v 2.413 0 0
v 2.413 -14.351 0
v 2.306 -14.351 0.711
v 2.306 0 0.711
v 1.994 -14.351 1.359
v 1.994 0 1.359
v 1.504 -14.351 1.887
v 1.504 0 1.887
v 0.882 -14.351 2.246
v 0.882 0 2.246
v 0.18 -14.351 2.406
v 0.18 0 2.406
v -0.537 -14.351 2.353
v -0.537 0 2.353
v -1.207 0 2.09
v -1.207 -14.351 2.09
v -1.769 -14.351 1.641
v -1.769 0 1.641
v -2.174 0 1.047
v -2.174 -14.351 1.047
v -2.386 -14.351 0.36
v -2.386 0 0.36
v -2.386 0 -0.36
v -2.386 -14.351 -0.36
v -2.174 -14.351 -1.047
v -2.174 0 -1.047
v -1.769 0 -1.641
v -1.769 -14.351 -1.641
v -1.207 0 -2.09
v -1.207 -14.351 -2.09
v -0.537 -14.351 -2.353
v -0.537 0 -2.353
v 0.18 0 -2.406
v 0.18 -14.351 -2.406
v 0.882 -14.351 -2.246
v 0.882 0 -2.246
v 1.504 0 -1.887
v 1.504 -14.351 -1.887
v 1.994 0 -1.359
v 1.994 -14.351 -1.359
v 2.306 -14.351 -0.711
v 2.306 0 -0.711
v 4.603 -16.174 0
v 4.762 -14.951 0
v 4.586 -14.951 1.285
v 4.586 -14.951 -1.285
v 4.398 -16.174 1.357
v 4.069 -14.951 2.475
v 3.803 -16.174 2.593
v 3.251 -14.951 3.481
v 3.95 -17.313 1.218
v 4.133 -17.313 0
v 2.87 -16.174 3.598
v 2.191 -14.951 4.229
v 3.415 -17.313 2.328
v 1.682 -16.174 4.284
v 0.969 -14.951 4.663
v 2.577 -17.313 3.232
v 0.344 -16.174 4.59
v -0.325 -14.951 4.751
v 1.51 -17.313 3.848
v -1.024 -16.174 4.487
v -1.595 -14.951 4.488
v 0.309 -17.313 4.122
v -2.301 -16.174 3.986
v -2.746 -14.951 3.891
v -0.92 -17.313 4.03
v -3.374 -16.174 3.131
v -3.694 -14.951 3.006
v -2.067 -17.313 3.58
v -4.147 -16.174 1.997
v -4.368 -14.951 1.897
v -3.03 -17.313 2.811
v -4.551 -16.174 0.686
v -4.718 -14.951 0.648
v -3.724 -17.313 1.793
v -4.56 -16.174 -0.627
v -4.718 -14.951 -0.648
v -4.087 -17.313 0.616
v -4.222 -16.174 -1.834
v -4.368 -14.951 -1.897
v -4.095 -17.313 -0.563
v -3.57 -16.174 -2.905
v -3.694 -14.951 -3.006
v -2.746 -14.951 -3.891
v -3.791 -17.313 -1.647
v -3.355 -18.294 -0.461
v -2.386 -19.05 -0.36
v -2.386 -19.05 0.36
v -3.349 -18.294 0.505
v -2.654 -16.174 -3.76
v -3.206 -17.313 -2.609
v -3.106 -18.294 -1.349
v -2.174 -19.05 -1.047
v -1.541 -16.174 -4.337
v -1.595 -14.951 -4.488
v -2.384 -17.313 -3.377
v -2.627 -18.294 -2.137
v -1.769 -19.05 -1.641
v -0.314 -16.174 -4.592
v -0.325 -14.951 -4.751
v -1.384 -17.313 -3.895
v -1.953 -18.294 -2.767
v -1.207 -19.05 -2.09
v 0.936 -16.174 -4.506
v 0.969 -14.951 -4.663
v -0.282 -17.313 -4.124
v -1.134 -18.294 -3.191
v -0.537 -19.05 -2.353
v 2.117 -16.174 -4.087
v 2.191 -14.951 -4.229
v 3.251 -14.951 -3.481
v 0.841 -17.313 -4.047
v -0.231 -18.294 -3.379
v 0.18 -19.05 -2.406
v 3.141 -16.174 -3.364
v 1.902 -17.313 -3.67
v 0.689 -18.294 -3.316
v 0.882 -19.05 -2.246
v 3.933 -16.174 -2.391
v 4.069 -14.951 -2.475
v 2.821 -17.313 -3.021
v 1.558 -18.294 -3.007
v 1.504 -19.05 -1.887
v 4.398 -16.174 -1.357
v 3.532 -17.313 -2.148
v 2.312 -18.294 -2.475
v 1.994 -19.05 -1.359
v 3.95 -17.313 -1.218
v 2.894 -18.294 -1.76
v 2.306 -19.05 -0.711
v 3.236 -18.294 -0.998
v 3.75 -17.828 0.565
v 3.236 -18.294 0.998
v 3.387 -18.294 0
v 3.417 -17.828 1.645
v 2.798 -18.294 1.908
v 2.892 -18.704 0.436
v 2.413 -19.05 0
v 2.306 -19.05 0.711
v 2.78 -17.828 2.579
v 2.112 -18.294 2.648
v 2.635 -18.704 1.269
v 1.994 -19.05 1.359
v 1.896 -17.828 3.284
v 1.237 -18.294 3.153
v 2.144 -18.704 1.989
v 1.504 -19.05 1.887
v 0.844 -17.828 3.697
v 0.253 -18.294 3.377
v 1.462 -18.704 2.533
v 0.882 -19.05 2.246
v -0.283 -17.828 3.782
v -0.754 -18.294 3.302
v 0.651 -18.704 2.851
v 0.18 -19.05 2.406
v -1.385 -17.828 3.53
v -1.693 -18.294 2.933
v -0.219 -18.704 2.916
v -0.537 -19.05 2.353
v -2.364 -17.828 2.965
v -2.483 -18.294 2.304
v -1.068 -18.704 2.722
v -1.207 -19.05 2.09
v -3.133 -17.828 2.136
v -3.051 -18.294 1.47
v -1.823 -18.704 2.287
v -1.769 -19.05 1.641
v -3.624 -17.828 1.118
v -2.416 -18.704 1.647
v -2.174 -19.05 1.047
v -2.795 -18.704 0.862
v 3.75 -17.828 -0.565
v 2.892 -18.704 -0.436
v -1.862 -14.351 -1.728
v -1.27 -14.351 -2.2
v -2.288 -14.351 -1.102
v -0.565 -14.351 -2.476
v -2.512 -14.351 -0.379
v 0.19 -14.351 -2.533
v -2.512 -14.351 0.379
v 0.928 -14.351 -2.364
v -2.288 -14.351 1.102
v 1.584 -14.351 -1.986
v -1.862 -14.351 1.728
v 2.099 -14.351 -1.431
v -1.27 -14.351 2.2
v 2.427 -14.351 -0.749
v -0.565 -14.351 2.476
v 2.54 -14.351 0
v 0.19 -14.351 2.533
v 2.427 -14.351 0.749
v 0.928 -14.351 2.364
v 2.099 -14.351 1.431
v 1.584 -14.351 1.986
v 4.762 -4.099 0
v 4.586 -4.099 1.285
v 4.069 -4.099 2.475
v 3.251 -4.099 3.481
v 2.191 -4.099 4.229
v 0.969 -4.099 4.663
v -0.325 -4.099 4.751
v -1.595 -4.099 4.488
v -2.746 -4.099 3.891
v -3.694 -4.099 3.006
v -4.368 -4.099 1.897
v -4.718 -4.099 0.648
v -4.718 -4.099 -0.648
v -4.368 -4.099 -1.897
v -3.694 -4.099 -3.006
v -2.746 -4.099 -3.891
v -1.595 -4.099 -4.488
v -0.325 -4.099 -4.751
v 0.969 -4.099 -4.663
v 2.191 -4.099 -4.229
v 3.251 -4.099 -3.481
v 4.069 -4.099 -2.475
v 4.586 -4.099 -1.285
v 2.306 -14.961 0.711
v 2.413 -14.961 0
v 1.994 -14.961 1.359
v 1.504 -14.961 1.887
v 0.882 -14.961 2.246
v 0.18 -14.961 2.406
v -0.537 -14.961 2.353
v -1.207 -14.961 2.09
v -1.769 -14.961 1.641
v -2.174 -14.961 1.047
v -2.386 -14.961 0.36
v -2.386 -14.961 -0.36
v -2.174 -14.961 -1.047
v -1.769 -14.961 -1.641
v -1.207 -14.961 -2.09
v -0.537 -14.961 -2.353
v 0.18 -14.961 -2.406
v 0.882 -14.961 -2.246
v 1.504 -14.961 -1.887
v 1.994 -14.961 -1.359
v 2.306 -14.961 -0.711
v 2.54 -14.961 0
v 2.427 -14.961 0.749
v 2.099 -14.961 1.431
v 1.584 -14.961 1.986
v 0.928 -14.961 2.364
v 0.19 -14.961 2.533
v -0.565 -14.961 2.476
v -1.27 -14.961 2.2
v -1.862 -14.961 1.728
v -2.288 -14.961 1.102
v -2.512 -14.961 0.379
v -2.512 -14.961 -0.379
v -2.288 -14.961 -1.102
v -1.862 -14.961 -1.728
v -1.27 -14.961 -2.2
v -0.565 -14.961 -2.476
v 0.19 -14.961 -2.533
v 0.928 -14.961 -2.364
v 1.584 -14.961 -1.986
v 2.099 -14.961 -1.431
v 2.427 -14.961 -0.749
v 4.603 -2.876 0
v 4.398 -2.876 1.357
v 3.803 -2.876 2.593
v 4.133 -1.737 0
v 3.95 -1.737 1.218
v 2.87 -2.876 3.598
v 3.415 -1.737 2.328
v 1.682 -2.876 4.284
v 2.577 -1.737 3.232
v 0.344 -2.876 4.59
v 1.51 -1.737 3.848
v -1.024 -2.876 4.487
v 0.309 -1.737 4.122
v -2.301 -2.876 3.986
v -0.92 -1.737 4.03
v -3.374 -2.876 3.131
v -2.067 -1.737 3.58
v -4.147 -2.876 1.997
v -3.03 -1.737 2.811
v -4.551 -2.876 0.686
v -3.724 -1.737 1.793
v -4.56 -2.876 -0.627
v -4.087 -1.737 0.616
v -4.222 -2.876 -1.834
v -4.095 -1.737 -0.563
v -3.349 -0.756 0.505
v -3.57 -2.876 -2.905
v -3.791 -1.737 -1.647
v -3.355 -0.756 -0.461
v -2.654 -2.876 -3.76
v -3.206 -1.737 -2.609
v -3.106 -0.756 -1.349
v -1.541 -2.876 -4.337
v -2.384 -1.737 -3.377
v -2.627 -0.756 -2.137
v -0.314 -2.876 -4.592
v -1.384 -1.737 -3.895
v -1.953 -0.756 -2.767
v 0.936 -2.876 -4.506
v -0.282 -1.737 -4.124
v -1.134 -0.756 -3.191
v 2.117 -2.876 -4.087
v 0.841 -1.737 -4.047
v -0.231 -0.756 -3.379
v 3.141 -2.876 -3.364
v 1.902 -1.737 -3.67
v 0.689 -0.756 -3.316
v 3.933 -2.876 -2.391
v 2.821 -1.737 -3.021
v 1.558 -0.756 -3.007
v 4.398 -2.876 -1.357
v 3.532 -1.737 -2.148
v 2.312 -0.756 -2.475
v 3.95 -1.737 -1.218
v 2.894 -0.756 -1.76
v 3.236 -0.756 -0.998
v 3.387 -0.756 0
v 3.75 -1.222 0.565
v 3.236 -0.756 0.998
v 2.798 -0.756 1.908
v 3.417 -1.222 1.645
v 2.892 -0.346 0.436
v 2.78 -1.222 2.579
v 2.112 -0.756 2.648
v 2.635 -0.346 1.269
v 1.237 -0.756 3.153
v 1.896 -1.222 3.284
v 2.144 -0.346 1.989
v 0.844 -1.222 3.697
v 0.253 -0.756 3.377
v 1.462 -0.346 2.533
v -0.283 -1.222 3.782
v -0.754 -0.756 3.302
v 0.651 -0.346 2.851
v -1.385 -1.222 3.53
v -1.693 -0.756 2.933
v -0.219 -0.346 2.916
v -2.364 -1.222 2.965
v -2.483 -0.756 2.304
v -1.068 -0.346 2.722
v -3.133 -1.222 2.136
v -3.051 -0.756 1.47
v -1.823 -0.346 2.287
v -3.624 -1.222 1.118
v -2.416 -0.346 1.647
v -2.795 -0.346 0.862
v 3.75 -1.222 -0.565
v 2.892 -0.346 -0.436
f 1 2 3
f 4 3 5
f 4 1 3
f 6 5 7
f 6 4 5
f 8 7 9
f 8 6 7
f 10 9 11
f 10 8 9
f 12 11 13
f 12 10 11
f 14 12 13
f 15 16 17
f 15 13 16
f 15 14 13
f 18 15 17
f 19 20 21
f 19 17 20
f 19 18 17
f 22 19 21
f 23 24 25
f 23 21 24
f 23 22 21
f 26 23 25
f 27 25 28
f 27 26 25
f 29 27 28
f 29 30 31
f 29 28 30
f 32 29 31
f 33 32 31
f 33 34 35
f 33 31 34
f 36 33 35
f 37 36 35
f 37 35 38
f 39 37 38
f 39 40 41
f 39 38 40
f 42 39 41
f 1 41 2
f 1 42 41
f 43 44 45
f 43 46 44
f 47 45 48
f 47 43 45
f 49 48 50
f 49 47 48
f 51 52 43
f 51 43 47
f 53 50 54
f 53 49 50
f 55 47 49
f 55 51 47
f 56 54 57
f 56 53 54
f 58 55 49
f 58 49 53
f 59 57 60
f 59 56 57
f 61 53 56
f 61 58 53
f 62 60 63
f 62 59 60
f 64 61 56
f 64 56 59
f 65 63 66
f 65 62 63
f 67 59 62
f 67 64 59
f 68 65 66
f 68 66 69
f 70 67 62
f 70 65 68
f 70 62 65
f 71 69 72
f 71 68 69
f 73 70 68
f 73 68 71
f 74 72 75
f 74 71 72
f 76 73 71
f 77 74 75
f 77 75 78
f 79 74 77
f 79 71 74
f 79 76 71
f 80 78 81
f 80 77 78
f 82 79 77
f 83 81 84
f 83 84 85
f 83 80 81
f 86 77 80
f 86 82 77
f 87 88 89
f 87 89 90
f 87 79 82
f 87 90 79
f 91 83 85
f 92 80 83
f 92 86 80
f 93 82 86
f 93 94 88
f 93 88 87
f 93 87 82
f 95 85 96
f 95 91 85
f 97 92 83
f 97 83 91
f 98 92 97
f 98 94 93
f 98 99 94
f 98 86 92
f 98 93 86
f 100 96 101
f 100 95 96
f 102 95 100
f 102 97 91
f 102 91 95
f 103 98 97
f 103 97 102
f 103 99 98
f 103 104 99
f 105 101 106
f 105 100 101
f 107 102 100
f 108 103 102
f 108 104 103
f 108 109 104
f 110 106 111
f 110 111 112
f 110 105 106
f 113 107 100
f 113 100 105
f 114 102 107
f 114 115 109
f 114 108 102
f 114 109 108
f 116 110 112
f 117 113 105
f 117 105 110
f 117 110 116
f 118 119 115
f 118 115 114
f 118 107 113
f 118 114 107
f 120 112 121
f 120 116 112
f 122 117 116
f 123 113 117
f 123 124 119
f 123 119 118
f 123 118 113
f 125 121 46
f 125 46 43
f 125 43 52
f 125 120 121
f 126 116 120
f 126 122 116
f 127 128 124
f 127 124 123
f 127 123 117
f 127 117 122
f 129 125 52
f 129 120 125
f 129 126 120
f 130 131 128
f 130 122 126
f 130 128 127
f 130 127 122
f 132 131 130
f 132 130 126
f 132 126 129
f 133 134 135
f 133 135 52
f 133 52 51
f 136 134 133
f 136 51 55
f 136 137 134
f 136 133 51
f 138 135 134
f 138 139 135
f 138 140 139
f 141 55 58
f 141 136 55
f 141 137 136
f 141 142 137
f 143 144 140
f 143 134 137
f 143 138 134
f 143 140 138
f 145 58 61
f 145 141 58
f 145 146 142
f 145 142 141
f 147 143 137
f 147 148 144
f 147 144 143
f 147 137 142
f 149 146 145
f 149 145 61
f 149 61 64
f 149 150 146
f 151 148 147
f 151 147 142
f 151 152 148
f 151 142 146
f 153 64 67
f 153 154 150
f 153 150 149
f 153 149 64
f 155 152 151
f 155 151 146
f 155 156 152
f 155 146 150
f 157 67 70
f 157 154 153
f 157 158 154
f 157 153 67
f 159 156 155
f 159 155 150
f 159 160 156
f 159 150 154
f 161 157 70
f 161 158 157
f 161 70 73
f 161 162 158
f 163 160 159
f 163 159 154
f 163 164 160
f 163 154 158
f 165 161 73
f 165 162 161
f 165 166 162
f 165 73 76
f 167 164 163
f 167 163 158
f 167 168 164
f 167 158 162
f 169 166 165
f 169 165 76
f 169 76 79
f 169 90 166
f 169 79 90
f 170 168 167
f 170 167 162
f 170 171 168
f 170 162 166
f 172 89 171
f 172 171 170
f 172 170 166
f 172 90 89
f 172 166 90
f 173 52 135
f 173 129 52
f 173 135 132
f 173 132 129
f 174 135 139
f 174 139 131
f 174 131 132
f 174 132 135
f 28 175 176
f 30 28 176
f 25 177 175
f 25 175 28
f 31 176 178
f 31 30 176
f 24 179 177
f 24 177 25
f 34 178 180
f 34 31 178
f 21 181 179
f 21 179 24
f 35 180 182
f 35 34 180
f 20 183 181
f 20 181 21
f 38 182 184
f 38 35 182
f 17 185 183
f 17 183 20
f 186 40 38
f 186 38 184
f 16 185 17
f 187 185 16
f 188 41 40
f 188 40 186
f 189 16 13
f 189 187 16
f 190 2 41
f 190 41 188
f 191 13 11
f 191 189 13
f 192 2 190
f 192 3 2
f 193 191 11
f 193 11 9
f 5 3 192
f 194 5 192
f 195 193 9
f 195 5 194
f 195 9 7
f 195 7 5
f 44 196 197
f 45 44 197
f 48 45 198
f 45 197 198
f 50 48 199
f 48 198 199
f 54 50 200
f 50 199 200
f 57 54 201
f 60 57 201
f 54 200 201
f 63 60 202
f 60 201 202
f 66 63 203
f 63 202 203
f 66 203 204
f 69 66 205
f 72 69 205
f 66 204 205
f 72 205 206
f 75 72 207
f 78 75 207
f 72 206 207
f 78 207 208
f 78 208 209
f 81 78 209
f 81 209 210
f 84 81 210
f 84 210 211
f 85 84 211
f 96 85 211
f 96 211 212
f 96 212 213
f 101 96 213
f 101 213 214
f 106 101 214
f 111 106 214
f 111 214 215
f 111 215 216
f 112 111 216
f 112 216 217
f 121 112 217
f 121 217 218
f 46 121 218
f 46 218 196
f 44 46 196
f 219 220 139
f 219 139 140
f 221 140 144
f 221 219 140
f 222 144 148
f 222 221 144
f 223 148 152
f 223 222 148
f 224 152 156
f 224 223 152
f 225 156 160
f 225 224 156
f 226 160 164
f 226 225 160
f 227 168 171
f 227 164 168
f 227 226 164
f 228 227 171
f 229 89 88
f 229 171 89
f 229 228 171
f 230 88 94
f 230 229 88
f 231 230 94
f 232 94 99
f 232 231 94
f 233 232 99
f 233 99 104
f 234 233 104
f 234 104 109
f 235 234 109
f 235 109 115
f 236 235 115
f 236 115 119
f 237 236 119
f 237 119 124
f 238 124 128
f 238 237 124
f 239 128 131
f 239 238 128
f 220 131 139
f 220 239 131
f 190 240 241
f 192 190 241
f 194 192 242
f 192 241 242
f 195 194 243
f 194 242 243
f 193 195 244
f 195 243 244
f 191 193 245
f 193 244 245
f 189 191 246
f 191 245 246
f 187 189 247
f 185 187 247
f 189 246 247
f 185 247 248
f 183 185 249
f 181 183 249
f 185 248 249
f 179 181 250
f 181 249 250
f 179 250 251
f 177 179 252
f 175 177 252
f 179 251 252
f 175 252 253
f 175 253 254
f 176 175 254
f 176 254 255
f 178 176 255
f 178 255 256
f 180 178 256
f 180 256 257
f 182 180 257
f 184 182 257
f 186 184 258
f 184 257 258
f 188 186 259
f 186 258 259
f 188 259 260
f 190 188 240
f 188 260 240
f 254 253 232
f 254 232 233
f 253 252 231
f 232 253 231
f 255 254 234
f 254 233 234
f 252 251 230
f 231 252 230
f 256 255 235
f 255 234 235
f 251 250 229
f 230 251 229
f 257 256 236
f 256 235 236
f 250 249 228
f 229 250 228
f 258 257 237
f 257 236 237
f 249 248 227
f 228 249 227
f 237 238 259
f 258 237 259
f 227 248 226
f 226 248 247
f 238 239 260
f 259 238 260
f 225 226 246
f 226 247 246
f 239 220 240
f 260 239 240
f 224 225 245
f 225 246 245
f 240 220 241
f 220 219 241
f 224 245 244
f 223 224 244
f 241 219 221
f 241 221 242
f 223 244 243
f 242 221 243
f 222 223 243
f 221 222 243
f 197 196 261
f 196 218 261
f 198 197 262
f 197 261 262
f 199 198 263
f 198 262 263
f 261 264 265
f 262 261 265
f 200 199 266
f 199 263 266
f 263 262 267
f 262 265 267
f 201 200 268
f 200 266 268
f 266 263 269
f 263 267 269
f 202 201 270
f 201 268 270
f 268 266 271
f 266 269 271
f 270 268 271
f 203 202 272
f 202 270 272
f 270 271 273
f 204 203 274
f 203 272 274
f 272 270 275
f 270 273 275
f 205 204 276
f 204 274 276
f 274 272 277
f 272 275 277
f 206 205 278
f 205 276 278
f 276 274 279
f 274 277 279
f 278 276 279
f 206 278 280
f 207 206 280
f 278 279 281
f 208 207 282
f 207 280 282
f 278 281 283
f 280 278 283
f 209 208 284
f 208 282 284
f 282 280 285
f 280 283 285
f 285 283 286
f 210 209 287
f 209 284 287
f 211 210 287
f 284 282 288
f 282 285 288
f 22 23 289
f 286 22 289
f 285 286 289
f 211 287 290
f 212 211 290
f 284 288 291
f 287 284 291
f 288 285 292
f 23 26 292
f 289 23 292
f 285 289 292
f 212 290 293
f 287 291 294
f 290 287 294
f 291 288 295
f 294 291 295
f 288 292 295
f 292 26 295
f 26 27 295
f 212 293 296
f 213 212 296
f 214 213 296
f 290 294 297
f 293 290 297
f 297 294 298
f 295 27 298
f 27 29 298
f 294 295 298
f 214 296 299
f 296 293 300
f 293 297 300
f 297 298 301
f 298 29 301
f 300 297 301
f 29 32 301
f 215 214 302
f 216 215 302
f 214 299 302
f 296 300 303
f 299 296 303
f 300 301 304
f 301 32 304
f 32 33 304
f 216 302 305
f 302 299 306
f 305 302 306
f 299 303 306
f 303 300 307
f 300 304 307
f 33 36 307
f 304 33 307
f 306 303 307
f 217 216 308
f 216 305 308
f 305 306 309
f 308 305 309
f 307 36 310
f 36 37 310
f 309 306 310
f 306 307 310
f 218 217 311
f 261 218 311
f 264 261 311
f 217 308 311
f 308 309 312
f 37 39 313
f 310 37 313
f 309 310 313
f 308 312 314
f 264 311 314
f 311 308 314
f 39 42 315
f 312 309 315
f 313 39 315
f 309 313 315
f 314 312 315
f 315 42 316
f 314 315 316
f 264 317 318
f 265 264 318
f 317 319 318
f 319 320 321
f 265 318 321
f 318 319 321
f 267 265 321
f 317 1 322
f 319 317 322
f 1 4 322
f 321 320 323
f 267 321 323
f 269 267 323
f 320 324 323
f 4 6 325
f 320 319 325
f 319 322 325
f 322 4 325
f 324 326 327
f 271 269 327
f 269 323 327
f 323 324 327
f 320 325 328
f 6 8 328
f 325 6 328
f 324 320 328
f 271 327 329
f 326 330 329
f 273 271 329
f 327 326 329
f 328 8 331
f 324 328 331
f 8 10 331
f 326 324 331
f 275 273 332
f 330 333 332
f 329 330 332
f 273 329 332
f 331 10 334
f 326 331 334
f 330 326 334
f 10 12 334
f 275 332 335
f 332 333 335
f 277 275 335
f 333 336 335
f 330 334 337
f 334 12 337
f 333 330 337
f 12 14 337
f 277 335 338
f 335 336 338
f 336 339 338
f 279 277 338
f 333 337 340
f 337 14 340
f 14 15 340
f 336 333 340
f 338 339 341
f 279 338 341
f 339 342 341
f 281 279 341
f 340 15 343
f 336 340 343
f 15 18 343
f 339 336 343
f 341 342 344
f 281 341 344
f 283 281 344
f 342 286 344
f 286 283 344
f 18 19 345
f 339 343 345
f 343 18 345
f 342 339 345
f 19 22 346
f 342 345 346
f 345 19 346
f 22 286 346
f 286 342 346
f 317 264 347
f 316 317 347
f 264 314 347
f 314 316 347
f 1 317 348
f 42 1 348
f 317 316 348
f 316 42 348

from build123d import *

# Parameters (mm, degrees)
F0_R     = 4.7625
F1_DEPTH = 19.05
F4_R     = 2.413
F5_DEPTH = 19.051
F8_R     = 2.54
F9_DEPTH = 0.6096


# Not quite as in the source:
# - a fillet or chamfer that OpenCascade refuses, or shapes differently, is made with other operations: its cross-section is extruded or revolved along the edge and cut away or added


with BuildPart() as f1:
    # F0 (on Front) → F1 (new body)
    with BuildSketch(Plane.XZ):
        Circle(F0_R)
    extrude(amount=F1_DEPTH)

    # F4 (on face) → F5 (cut, through all)
    with BuildSketch(Plane.XZ):
        Circle(F4_R)
    extrude(amount=F5_DEPTH, mode=Mode.SUBTRACT)

    # F6: fillet of radius 4.7498 on 2 edges, made by hand

    # F6_s1 → F6_t2 (revolve, cut)
    with BuildSketch(Plane.XY):
        with BuildLine():
            ThreePointArc((4.7625, -4.0986778295), (4.1334732879, -1.7365119695), (2.413, 0))
            Line((2.413, 0), (4.7625, 0))
            Line((4.7625, 0), (4.7625, -4.0986778295))
        make_face()
    revolve(axis=Axis((0, 0, 0), (0, -1, 0)), mode=Mode.SUBTRACT)

    # F6_s3 → F6_t4 (revolve, cut)
    with BuildSketch(Plane.XY):
        with BuildLine():
            ThreePointArc((4.7625, -14.9513221705), (4.1334732879, -17.3134880305), (2.413, -19.05))
            Line((2.413, -19.05), (4.7625, -19.05))
            Line((4.7625, -19.05), (4.7625, -14.9513221705))
        make_face()
    revolve(axis=Axis((0, -19.05, 0), (0, -1, 0)), mode=Mode.SUBTRACT)

    # F8 (on offset) → F9 (cut)
    with BuildSketch(Plane.XZ.offset(14.9606)):
        Circle(F8_R)
    extrude(amount=-F9_DEPTH, mode=Mode.SUBTRACT)


solid = f1.part
